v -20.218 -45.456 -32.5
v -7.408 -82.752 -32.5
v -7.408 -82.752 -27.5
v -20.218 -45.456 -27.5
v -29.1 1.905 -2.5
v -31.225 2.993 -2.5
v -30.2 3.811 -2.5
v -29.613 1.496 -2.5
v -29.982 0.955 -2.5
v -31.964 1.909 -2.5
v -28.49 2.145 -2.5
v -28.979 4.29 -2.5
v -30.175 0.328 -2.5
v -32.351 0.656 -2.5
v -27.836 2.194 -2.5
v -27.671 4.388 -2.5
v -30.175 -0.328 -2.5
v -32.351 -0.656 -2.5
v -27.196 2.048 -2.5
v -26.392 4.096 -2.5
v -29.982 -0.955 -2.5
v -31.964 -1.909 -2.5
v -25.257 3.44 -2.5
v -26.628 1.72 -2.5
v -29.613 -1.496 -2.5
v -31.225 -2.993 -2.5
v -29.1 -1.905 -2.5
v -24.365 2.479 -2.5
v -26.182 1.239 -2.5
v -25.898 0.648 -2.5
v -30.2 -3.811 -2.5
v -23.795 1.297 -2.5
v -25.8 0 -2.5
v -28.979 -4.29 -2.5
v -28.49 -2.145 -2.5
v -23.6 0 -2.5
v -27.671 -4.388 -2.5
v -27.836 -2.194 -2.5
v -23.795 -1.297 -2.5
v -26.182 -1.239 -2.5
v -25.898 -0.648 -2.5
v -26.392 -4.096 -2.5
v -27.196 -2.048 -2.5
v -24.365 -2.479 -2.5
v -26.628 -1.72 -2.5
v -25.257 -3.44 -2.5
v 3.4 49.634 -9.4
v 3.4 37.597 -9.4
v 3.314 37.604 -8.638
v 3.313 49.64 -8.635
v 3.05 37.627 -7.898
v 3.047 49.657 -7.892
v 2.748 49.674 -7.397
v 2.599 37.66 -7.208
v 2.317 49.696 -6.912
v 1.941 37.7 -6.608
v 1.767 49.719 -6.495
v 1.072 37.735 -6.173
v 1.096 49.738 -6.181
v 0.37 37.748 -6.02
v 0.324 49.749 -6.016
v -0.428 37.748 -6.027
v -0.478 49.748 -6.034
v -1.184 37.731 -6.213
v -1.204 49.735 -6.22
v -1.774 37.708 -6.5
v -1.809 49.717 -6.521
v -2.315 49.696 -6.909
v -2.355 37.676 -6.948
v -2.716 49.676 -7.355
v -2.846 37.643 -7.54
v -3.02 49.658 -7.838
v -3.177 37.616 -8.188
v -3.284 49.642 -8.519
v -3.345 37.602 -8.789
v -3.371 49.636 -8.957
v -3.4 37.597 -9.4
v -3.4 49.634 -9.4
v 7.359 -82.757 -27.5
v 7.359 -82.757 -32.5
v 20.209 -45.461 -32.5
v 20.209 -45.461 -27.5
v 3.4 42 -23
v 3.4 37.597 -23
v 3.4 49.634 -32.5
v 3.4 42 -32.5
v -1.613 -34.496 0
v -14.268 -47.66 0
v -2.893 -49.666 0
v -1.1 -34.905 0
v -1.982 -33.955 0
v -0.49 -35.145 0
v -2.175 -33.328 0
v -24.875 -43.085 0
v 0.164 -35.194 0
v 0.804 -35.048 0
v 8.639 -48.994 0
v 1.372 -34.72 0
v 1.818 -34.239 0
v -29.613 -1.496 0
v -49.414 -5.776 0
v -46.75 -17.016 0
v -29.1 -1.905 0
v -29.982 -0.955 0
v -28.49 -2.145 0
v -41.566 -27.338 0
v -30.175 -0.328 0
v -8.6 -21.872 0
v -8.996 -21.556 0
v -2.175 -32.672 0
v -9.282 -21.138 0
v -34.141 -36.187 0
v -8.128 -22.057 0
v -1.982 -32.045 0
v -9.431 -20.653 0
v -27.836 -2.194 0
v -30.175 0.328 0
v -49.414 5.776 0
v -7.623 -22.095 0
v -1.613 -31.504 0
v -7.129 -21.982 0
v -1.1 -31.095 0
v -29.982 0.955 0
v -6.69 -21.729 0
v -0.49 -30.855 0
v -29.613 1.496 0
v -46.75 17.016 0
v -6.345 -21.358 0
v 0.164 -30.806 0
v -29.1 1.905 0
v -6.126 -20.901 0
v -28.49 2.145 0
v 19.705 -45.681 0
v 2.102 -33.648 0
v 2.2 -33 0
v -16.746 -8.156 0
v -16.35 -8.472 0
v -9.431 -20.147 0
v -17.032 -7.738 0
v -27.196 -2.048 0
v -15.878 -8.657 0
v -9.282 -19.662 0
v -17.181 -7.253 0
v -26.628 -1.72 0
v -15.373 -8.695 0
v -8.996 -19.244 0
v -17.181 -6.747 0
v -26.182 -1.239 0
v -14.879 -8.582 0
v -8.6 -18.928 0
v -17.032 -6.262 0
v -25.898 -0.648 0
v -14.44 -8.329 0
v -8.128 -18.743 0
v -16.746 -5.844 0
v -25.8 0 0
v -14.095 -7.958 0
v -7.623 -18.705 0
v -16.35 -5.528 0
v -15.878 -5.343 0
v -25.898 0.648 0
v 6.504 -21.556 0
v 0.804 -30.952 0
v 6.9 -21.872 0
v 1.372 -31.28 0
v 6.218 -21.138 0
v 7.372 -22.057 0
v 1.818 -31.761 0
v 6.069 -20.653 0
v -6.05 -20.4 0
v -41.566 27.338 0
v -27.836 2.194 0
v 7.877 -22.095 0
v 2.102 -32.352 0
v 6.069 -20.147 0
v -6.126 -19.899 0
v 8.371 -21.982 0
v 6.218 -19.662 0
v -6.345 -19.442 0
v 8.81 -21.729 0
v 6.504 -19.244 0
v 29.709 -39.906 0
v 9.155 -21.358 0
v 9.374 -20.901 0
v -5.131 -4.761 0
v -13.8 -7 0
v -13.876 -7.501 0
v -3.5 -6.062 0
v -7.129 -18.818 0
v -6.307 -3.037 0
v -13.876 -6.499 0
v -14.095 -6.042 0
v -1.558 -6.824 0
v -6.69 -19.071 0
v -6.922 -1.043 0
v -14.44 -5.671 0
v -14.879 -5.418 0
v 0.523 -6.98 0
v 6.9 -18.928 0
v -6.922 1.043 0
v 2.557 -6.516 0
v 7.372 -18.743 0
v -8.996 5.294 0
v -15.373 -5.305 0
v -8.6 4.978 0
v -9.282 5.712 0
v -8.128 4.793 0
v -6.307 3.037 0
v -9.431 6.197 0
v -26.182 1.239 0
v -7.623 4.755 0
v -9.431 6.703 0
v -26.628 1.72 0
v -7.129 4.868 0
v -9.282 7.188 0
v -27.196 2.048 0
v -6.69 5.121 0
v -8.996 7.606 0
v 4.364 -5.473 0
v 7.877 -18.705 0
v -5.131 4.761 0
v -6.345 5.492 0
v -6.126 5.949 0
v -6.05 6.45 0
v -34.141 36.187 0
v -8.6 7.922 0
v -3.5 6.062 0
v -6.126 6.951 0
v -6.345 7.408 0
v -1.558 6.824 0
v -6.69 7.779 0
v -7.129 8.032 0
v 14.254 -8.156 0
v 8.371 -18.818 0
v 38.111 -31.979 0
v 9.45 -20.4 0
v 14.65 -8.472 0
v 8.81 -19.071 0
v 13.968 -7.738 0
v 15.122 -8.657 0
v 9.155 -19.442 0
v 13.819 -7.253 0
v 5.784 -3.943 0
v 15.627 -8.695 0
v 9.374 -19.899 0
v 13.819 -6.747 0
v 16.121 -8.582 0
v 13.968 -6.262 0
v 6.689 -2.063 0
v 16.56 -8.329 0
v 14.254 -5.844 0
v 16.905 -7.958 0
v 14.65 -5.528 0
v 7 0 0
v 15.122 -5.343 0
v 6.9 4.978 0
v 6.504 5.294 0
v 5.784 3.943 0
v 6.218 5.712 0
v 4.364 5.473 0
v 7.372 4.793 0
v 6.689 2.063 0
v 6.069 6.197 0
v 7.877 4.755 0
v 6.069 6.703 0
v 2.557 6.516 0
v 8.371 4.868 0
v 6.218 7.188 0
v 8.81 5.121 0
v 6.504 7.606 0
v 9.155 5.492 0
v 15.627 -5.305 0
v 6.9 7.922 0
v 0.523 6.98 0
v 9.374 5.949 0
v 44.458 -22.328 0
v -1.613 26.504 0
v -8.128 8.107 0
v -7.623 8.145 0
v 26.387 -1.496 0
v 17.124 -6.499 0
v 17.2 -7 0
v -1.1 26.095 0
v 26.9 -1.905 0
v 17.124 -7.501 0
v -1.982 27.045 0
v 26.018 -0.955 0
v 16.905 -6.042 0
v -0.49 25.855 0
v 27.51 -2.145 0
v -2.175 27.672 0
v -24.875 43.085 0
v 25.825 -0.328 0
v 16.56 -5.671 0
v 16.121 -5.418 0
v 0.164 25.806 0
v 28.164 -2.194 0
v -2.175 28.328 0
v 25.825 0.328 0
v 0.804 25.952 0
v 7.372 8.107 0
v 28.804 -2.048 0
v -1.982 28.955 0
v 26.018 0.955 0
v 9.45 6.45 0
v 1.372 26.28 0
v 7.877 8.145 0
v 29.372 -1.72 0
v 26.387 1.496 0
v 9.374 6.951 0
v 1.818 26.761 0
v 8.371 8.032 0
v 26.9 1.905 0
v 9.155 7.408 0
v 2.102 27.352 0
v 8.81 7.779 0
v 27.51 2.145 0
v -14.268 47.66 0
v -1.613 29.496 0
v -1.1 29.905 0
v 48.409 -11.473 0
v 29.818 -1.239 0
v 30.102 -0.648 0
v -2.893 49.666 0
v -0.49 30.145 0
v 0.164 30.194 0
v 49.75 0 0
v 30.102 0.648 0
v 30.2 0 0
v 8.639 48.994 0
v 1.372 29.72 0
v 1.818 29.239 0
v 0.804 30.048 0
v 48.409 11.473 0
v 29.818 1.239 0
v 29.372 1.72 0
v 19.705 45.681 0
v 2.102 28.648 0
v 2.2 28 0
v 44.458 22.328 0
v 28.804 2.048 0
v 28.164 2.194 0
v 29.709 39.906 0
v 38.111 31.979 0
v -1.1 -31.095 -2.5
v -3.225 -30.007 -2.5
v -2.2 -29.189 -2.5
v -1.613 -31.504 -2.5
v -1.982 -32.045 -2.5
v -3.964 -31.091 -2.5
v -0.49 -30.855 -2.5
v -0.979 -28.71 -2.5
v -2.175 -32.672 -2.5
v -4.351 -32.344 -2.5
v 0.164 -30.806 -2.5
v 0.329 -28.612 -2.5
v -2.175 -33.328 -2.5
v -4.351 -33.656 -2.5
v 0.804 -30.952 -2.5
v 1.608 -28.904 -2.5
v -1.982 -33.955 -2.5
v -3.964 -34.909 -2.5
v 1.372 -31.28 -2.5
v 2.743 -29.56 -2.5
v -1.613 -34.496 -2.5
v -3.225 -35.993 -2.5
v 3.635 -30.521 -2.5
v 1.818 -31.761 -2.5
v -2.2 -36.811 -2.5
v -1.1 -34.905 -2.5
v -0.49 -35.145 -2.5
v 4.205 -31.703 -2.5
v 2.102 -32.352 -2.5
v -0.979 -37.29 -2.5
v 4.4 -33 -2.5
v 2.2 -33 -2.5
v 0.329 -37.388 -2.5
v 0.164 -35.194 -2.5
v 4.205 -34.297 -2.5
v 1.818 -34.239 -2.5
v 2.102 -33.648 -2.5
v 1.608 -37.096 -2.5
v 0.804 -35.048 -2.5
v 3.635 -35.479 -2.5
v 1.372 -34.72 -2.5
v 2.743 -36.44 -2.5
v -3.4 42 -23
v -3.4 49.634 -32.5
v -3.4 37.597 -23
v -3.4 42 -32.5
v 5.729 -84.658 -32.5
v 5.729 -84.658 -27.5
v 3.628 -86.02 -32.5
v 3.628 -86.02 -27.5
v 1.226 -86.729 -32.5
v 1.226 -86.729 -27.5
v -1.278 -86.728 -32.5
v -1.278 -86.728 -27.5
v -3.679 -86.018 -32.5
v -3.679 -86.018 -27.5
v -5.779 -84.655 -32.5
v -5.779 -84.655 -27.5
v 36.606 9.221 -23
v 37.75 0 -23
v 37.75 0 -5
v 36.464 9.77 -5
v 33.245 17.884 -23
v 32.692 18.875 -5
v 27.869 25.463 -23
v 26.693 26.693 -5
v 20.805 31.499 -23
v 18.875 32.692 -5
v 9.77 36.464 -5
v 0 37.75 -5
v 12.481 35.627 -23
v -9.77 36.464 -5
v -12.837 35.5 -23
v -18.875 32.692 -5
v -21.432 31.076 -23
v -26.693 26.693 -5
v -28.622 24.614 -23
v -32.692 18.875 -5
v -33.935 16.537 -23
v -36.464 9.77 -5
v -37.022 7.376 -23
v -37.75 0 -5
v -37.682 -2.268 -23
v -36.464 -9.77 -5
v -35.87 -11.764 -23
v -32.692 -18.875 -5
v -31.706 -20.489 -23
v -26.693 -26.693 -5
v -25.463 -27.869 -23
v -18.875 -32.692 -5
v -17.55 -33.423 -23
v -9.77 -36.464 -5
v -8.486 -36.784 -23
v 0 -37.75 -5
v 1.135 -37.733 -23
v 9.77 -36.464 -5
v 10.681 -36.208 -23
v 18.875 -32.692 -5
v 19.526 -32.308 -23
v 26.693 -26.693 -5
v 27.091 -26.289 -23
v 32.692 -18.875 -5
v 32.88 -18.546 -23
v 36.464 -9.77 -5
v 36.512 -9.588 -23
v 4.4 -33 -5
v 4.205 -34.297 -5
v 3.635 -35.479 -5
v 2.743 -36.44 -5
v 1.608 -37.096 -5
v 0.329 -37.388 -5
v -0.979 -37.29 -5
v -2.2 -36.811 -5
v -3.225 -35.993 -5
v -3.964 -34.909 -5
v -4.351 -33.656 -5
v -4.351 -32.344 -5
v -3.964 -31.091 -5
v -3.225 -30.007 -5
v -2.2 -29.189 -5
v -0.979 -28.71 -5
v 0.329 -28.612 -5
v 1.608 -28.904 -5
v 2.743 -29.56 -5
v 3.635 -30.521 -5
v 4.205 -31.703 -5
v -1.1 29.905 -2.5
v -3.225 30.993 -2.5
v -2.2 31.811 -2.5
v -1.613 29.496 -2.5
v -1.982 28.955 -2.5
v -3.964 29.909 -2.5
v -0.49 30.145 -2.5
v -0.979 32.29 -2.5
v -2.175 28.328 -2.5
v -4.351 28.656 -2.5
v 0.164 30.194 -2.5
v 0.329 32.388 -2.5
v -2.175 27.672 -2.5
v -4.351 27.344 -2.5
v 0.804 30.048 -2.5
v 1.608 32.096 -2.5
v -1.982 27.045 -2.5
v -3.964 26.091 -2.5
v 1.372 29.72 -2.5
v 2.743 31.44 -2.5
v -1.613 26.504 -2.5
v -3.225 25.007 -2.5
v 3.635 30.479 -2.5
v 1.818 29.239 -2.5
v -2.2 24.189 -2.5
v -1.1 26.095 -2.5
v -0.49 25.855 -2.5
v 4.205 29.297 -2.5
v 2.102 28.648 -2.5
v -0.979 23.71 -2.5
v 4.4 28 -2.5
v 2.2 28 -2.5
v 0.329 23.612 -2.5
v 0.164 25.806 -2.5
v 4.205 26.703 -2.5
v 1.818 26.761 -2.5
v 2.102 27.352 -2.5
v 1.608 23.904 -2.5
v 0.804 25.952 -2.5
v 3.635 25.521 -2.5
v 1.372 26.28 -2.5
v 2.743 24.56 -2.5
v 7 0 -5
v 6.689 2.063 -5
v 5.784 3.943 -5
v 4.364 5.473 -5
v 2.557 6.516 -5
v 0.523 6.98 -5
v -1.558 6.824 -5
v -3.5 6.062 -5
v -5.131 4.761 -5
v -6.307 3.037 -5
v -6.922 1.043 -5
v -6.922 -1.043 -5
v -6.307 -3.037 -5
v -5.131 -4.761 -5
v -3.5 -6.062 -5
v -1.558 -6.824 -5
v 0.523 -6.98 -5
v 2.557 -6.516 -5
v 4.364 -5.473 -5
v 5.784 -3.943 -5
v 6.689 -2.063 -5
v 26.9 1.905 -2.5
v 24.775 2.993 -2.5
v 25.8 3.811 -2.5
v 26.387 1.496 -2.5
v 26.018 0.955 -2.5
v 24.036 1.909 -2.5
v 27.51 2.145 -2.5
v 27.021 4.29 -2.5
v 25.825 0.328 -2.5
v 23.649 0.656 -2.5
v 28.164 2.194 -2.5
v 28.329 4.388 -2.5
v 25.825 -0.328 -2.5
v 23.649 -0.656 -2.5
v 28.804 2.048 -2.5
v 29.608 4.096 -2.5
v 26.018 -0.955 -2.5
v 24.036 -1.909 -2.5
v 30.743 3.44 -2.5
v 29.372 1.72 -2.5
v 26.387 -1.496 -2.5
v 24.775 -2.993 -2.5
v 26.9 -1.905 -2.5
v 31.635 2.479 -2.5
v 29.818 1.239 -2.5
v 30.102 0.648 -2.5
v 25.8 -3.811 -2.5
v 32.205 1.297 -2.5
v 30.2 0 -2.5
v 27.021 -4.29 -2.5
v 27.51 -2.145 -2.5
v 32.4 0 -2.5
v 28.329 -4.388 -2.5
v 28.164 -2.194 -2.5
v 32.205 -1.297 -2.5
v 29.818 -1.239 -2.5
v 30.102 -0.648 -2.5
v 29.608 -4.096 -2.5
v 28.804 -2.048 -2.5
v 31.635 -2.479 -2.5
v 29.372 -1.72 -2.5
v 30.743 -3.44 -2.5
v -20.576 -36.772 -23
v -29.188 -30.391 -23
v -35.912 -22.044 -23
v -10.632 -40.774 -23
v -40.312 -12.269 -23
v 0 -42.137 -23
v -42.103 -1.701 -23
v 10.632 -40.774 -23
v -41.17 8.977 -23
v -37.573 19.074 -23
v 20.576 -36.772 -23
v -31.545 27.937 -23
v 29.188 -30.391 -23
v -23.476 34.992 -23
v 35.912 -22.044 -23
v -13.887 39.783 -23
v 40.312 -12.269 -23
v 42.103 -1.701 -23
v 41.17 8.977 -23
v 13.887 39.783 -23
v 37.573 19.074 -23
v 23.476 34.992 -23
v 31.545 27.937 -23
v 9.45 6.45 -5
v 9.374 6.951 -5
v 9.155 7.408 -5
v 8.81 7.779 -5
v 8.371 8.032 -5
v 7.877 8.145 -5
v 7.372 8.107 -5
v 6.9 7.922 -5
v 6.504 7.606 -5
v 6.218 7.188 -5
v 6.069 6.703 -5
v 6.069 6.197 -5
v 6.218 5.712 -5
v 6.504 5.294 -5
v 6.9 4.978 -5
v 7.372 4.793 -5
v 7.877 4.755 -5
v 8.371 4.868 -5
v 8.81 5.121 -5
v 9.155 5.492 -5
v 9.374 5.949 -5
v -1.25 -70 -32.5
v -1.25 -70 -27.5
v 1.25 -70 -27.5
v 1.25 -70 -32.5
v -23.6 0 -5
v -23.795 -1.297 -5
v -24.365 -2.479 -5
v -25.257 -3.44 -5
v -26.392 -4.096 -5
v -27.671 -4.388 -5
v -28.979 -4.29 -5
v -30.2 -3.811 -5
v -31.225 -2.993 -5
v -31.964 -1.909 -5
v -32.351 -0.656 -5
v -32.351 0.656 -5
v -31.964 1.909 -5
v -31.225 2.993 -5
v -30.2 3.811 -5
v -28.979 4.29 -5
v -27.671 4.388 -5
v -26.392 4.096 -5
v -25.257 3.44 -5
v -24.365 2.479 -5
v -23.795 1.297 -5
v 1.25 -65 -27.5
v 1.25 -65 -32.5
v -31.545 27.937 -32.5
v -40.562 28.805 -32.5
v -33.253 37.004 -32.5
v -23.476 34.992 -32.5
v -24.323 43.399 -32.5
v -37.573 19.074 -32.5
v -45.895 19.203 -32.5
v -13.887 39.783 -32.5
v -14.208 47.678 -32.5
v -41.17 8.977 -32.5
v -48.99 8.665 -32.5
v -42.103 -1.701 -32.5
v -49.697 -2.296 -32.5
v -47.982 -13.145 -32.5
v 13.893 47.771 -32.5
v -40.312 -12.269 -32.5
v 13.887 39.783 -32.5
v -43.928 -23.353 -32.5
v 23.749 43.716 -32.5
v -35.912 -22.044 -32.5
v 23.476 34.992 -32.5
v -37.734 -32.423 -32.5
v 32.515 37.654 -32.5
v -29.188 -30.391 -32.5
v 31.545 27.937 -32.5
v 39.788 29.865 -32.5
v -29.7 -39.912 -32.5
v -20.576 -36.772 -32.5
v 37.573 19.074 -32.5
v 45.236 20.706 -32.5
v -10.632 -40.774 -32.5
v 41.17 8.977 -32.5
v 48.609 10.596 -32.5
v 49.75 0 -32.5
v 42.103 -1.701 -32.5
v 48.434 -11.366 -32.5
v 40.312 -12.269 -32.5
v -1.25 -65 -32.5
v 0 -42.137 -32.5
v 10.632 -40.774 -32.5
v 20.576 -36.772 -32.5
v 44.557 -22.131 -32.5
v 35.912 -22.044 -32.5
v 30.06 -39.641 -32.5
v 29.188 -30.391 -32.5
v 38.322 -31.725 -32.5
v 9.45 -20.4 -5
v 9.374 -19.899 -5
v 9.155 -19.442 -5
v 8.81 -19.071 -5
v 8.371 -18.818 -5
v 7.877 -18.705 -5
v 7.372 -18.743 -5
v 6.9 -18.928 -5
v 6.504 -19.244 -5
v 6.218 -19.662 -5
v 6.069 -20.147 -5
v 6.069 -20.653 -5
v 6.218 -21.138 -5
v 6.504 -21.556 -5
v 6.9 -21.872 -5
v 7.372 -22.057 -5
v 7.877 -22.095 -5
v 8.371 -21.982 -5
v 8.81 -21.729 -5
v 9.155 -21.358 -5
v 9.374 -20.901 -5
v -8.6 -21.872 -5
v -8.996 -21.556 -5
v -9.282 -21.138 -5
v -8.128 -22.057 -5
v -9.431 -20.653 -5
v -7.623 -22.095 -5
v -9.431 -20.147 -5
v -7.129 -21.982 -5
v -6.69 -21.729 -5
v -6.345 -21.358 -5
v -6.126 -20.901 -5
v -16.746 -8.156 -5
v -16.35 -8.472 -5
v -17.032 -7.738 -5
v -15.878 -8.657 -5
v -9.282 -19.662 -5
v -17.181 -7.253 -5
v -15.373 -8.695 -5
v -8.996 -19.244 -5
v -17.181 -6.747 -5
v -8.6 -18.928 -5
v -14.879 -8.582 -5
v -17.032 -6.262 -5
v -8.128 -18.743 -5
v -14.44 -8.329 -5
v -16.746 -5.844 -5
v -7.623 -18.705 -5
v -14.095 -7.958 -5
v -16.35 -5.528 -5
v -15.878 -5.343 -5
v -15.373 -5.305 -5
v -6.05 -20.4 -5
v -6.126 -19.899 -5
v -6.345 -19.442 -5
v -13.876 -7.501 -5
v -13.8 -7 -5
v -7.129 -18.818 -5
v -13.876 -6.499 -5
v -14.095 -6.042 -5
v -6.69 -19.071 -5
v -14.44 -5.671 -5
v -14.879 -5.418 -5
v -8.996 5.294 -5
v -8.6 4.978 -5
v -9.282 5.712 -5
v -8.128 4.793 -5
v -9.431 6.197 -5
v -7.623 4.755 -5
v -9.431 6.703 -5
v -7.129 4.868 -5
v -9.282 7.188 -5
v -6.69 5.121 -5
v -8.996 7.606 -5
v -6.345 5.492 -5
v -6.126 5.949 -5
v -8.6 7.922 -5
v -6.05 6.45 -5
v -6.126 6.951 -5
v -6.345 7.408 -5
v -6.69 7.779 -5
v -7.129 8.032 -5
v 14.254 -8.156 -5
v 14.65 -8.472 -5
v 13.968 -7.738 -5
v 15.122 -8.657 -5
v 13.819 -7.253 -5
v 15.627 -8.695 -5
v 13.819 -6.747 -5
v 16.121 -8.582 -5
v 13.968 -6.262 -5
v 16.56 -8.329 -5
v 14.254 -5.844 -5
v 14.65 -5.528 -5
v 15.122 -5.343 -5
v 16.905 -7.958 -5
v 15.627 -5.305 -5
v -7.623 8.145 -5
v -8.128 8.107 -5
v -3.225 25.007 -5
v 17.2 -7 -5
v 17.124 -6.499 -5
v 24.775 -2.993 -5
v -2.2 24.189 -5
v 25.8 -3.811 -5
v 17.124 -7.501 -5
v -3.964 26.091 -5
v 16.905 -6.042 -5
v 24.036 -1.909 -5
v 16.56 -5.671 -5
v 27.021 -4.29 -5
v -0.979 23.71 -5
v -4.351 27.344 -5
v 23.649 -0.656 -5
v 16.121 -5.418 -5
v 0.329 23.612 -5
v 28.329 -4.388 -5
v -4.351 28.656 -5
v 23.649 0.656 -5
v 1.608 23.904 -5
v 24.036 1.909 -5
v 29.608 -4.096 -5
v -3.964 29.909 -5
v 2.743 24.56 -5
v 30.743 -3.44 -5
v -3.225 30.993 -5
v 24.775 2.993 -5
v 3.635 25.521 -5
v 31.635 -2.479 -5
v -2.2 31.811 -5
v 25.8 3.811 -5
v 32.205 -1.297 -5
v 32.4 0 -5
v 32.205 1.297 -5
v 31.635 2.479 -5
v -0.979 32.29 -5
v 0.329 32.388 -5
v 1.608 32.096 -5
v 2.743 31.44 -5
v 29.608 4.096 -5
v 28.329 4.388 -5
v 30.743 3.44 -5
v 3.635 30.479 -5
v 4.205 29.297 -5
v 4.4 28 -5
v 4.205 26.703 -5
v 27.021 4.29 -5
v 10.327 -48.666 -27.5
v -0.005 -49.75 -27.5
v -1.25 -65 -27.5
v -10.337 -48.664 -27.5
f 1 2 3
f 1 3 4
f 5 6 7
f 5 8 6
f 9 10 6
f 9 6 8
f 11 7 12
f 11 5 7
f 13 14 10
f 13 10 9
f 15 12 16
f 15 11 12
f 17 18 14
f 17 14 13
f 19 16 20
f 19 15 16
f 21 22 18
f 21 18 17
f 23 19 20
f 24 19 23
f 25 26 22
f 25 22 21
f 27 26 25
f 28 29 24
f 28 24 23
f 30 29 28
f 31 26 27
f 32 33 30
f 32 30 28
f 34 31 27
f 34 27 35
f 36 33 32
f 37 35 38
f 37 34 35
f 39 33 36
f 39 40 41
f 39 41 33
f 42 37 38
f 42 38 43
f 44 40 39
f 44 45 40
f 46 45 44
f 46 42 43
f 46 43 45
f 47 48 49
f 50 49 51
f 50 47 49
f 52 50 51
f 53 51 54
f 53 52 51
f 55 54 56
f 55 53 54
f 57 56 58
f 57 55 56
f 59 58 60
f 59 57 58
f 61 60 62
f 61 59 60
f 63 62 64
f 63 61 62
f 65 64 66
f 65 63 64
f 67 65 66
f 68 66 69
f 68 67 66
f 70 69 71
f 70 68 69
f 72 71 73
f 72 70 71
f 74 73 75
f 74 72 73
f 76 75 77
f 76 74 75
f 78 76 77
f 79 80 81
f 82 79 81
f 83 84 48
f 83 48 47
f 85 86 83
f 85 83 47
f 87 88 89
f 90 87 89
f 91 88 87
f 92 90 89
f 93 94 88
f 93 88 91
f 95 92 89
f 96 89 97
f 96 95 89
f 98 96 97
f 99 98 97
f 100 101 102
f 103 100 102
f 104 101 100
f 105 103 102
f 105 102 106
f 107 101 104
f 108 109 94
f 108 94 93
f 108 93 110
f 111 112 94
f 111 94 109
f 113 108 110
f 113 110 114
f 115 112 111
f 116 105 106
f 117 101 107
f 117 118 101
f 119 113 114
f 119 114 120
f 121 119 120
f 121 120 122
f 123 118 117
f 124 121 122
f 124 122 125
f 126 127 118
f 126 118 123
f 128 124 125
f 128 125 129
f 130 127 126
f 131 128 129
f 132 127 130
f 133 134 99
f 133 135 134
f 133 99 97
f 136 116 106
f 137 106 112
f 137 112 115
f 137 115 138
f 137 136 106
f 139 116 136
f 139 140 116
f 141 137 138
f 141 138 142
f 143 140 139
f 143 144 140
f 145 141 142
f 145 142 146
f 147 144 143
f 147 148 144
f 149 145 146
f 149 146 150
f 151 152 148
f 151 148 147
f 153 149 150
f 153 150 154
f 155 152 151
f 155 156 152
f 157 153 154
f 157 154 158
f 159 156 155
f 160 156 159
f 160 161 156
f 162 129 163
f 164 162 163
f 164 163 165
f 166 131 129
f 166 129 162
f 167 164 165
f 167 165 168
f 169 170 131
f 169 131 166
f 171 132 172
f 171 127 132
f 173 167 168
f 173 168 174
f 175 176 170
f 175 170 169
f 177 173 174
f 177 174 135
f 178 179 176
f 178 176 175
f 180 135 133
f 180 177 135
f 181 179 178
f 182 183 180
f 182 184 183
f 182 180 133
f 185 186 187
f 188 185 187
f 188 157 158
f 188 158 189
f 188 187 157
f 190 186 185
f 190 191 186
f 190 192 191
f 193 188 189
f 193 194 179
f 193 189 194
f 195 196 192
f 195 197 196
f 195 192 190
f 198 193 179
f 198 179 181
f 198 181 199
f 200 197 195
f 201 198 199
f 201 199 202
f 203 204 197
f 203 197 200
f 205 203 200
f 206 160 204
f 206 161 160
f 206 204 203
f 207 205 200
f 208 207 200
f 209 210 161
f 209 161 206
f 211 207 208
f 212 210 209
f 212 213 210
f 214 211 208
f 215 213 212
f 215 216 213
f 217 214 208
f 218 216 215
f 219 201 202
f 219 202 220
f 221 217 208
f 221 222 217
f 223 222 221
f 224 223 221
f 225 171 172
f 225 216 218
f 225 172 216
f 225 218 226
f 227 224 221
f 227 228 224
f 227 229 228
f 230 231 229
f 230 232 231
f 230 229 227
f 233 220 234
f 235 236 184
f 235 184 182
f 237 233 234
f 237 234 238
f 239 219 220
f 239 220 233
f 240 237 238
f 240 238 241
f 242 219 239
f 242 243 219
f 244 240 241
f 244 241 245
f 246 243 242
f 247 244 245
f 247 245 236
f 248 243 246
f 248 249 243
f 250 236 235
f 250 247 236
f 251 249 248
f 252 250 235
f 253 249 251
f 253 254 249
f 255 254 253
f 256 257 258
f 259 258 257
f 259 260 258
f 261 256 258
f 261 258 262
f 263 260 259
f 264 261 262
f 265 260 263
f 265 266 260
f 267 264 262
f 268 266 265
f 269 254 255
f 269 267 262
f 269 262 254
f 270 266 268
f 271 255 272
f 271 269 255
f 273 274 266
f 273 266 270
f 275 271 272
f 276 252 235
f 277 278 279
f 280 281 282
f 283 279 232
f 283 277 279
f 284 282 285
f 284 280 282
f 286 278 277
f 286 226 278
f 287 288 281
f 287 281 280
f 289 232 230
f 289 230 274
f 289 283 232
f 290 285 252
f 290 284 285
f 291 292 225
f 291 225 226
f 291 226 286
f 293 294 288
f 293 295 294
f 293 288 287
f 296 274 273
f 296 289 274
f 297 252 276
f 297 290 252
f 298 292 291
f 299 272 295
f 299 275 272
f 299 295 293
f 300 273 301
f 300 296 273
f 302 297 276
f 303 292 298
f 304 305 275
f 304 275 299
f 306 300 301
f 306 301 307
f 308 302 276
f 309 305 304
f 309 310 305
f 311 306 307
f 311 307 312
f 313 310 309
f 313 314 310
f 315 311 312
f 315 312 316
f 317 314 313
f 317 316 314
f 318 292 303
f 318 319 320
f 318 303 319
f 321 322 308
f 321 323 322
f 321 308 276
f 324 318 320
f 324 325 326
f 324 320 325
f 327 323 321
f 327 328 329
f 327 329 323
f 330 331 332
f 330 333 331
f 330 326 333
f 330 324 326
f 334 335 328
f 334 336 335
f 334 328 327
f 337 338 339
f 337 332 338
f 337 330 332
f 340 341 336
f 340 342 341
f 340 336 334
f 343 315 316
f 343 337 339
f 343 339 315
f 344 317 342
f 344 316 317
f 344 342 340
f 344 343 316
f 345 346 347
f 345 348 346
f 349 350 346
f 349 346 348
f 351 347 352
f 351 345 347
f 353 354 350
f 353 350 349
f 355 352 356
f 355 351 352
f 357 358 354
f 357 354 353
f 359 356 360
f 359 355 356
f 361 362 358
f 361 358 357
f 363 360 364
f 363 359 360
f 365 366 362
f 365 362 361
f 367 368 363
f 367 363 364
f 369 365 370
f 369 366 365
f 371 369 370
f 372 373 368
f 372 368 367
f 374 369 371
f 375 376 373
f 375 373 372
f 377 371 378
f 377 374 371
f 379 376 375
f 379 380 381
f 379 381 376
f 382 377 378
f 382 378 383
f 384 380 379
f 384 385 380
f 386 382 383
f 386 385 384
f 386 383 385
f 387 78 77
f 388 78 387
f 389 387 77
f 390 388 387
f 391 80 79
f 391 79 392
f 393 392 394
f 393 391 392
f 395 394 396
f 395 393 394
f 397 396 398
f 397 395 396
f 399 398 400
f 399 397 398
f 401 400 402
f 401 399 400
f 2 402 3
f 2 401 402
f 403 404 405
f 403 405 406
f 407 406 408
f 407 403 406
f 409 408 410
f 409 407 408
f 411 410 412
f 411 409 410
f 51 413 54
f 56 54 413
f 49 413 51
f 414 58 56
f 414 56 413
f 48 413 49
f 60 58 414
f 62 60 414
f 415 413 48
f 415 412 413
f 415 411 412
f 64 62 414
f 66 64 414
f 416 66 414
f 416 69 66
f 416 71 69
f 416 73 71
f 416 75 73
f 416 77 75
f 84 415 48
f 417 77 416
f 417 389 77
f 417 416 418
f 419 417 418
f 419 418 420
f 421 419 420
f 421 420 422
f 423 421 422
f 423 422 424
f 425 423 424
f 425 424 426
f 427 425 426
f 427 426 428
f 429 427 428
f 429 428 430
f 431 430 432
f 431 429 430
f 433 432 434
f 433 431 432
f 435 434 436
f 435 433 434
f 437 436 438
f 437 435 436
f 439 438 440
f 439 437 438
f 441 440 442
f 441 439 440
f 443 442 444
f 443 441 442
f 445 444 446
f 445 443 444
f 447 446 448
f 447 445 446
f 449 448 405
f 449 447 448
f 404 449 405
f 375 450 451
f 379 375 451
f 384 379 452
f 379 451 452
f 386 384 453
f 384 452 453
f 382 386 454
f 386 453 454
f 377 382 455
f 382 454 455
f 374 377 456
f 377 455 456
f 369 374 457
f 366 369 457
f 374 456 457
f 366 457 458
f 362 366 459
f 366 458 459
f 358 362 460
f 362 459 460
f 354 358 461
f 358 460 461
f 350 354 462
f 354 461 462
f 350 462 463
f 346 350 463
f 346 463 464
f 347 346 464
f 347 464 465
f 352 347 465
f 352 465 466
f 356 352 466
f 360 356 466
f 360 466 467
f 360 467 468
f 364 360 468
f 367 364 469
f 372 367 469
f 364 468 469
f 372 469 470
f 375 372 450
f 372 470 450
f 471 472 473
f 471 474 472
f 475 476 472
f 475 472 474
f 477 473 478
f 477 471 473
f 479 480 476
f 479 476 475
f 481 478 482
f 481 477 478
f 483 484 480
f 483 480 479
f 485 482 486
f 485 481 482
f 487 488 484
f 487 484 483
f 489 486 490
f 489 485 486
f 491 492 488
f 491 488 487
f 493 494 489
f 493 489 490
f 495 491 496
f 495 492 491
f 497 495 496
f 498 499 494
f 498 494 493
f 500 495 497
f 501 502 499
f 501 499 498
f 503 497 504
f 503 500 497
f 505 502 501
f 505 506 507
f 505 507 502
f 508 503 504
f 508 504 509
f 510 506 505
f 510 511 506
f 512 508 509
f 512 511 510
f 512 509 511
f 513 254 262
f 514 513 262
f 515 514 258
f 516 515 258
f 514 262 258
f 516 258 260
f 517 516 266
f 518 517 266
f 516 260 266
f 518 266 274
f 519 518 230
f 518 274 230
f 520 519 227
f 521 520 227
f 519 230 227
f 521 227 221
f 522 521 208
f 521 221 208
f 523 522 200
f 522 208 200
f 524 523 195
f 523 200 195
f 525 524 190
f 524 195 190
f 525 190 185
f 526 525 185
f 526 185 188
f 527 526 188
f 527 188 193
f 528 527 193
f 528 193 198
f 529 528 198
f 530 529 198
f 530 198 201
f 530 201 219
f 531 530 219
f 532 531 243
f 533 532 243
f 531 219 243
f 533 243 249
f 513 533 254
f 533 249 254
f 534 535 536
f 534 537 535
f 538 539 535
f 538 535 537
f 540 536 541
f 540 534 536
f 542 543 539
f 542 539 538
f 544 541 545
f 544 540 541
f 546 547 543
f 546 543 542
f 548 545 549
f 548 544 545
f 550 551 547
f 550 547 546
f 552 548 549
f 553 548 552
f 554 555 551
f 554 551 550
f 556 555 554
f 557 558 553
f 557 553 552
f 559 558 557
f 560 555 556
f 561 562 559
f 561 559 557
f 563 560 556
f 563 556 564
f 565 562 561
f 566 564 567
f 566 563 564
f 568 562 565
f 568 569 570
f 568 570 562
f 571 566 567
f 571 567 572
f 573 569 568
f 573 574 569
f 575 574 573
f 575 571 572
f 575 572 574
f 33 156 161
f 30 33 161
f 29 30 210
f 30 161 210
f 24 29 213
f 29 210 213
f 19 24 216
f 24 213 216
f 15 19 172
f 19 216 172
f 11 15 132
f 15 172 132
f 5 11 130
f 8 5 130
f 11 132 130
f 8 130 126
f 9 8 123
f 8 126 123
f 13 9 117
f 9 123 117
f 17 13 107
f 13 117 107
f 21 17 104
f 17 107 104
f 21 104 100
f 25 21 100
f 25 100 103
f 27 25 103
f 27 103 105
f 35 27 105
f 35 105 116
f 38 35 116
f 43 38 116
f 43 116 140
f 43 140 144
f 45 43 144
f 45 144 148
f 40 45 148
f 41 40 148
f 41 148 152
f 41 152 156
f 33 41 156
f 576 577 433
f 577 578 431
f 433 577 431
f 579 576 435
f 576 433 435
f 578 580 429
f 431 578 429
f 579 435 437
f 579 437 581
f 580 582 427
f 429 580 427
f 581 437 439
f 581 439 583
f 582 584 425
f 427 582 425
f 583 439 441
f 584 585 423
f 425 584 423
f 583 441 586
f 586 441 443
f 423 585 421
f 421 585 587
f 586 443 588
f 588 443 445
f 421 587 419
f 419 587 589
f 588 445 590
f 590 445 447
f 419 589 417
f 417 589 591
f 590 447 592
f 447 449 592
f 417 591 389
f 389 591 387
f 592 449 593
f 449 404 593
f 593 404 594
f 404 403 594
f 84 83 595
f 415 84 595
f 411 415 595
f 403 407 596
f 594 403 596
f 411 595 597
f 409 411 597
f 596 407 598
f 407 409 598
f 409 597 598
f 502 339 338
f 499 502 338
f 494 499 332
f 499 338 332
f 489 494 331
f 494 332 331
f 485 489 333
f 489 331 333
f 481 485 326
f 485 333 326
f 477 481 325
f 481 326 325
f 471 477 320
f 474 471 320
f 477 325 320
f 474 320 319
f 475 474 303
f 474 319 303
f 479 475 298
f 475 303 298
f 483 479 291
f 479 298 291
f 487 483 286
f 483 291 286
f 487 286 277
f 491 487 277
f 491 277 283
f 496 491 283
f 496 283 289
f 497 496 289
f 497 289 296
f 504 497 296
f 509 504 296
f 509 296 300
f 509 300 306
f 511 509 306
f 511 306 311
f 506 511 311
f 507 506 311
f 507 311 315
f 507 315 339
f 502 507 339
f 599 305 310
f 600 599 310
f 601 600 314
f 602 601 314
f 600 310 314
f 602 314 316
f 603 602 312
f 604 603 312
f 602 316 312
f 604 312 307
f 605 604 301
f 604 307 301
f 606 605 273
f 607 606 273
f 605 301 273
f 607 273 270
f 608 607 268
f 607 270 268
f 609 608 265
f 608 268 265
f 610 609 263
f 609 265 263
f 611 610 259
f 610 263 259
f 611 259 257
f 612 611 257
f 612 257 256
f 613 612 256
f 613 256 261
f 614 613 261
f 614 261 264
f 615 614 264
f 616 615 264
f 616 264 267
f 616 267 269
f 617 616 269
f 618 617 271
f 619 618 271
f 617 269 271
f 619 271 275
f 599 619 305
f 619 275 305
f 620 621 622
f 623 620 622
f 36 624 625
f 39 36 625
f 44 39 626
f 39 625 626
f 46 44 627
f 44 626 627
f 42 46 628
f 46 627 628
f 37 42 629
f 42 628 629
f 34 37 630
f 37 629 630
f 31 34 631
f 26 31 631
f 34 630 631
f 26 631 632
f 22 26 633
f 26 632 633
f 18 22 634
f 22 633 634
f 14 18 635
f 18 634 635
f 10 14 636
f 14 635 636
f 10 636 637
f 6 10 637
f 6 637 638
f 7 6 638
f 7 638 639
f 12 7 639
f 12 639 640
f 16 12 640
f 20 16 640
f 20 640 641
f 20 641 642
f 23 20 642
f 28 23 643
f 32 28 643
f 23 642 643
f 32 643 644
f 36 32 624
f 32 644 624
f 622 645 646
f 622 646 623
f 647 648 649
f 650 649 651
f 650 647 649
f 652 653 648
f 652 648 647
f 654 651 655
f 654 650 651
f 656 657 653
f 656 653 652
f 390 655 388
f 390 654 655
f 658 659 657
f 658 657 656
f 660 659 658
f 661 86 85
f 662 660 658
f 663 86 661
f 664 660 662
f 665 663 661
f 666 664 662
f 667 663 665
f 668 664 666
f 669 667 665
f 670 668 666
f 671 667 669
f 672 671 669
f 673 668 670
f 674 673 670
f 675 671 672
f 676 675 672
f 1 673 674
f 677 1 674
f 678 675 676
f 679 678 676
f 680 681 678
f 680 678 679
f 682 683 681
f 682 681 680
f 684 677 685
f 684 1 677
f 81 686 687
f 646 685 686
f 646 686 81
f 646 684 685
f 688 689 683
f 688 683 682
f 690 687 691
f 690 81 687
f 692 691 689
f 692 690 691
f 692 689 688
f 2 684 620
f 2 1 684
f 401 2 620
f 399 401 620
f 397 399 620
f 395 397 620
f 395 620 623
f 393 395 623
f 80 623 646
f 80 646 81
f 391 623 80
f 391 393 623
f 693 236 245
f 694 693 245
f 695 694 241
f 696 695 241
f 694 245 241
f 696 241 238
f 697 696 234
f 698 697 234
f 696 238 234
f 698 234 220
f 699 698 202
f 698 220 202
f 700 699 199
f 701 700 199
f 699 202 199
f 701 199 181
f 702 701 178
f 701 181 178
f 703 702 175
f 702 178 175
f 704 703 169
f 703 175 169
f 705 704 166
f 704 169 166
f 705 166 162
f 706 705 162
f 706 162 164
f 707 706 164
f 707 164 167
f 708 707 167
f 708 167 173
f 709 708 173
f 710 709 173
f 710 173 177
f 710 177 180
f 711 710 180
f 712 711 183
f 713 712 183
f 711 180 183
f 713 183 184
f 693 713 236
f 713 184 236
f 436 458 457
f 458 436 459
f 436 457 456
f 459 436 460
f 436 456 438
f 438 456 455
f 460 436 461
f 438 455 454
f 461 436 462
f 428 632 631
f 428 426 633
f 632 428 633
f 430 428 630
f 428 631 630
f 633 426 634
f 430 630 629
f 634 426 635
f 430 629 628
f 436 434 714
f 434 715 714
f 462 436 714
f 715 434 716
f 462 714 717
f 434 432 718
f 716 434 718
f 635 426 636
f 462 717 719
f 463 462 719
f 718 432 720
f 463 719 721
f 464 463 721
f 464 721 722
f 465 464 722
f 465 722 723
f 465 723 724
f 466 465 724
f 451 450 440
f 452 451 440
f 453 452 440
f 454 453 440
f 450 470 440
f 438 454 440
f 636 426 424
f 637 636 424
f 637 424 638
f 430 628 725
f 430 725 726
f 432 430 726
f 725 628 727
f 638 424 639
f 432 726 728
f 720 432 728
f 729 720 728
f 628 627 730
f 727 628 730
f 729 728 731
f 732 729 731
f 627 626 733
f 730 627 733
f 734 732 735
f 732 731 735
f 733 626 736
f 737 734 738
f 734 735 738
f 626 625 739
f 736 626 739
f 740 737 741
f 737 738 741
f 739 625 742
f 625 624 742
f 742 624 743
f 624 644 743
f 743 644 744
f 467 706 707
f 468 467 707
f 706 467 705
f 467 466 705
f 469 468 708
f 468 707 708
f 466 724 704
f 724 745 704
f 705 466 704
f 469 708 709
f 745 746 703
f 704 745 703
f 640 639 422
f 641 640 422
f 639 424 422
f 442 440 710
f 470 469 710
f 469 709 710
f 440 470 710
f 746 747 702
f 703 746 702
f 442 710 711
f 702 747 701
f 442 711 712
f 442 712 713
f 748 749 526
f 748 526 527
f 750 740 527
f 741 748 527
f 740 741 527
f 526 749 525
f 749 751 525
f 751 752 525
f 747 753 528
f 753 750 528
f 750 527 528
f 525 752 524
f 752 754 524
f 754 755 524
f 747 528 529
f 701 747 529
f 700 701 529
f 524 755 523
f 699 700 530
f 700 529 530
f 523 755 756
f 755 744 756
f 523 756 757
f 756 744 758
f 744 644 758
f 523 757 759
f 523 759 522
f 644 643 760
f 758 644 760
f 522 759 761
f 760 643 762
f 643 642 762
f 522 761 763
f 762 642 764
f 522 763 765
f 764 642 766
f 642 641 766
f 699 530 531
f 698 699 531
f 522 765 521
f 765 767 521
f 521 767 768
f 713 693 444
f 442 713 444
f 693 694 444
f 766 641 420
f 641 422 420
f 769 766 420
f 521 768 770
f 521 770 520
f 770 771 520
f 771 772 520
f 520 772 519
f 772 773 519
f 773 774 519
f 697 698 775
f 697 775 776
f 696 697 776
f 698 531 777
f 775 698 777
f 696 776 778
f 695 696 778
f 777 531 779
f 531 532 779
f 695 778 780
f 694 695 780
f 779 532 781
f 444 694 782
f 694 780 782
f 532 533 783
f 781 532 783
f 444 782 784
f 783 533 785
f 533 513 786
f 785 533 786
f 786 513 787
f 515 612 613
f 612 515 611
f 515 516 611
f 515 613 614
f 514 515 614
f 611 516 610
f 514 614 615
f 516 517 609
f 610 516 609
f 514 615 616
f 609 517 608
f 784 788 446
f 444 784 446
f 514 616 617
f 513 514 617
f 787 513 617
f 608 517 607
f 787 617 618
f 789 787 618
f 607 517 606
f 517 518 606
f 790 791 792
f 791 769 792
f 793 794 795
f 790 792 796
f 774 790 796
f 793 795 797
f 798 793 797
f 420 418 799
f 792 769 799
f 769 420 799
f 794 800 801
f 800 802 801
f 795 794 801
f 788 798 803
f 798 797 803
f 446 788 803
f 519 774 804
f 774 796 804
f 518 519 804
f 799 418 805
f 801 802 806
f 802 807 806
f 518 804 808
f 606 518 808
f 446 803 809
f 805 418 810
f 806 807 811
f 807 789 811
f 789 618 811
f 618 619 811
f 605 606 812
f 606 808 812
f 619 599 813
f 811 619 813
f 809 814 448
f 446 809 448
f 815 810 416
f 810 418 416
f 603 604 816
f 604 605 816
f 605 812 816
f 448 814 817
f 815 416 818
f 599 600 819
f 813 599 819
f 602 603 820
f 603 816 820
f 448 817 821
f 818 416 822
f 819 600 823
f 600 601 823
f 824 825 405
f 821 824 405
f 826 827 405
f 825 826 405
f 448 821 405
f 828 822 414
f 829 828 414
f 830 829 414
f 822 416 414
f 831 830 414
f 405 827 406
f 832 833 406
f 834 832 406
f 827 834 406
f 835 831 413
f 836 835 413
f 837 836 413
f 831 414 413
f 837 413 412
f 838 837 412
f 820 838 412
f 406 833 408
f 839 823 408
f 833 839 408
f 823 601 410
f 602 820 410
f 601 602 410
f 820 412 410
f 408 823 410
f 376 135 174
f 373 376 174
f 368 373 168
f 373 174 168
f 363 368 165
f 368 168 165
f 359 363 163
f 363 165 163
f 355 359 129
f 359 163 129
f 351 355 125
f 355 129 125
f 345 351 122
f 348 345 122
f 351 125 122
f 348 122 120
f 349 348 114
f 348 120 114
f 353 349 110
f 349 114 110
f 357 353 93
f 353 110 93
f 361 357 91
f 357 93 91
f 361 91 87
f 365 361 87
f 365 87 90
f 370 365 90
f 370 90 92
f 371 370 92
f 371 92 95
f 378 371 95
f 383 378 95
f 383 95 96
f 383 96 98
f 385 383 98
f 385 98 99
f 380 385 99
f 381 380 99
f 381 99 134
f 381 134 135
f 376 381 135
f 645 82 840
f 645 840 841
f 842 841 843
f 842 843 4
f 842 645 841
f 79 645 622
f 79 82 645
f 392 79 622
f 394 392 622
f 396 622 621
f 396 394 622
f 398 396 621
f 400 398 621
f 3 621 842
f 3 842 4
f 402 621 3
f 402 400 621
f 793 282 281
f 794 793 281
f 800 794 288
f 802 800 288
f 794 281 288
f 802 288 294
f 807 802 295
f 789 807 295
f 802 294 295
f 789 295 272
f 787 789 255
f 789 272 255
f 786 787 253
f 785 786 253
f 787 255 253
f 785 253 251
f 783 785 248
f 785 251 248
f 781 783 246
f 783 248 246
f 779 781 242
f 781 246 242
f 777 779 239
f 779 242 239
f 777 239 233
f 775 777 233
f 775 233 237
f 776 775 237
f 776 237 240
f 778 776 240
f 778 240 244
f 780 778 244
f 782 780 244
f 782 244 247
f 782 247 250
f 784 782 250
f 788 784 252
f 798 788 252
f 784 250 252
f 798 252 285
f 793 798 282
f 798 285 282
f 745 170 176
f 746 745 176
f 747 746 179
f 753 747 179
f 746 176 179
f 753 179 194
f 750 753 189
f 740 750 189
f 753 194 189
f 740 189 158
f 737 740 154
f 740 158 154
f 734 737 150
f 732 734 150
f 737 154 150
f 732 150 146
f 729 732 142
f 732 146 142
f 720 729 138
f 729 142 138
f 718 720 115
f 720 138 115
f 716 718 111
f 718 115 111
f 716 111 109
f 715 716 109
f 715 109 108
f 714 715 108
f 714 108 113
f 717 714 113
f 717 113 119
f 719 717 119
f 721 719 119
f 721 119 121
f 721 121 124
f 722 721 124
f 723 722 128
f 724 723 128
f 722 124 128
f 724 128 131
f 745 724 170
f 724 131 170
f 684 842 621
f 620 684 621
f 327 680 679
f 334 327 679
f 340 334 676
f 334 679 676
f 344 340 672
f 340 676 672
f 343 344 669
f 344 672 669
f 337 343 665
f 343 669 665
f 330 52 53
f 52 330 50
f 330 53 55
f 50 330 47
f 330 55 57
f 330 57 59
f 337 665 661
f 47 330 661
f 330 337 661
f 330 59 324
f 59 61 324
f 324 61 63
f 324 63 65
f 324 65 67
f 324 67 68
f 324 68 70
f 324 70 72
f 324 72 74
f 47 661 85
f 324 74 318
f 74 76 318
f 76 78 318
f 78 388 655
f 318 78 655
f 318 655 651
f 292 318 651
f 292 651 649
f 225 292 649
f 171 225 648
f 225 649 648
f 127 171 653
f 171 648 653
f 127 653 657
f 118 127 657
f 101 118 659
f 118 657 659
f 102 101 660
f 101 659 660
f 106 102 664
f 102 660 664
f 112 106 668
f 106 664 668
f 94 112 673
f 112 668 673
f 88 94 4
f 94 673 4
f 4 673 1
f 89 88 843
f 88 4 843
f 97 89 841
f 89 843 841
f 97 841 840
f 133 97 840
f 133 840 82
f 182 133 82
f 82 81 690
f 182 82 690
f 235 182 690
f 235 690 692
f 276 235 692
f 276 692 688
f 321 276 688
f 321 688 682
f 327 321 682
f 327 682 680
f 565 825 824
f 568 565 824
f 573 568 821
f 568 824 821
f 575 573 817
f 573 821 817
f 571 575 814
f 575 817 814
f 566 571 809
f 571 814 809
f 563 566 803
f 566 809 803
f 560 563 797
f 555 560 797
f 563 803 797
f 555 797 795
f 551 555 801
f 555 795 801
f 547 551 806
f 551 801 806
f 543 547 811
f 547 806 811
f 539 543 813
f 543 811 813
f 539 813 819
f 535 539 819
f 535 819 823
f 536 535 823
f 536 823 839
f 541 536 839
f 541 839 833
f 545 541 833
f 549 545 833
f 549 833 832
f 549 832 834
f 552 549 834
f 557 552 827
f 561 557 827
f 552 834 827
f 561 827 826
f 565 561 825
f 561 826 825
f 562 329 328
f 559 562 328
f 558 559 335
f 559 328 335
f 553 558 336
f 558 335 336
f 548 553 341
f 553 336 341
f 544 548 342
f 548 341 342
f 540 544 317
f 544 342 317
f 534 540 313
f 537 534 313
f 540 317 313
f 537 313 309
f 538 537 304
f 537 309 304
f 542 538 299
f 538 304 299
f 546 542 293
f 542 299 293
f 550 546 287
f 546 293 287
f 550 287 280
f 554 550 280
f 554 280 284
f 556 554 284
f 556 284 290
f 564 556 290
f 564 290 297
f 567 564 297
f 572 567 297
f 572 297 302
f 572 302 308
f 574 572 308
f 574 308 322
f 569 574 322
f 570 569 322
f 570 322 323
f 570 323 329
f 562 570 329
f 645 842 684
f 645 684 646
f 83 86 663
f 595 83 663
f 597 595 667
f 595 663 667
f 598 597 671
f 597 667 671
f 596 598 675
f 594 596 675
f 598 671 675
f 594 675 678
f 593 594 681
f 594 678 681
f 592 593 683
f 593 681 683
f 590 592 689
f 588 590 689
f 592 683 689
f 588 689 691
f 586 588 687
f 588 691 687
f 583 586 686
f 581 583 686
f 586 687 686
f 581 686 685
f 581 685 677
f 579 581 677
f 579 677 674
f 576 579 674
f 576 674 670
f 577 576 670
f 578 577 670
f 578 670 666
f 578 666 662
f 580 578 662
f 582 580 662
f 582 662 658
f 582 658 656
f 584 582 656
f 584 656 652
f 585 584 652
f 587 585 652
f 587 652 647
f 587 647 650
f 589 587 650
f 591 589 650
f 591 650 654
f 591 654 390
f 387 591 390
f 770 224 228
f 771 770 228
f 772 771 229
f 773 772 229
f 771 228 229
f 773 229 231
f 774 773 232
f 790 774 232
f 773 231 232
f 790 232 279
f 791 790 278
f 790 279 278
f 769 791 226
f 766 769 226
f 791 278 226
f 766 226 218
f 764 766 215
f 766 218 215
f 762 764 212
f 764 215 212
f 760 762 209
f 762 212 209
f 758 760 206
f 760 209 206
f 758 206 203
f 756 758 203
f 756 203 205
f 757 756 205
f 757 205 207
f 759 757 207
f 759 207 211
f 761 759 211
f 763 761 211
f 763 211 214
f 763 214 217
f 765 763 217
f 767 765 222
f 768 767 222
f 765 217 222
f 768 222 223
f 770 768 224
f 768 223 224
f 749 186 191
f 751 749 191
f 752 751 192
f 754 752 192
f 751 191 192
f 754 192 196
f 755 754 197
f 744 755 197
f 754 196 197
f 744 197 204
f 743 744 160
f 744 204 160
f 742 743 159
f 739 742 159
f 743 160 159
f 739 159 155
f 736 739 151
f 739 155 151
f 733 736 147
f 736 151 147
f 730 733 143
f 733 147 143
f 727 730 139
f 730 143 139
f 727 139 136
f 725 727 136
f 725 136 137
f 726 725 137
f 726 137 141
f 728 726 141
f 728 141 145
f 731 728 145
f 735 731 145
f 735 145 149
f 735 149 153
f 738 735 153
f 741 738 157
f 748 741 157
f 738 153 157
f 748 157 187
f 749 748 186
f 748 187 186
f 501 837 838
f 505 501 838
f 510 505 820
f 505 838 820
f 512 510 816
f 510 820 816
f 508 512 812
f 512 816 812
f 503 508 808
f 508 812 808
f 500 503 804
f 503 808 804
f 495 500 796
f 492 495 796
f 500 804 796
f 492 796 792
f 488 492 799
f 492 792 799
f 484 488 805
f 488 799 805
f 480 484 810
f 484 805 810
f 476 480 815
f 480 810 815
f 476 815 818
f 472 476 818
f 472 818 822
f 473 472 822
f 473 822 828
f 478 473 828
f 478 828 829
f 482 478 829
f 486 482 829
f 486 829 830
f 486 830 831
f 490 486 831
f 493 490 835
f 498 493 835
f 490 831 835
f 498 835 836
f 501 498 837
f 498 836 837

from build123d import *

# Parameters (mm, degrees)
CYLINDER008_R     = 2
CYLINDER008_DEPTH = 3.2
CYLINDER009_R     = 1.7
CYLINDER009_DEPTH = 30
CYLINDER007_R     = 37.75
CYLINDER007_DEPTH = 63
CYLINDER013_R     = 42.75
CYLINDER013_DEPTH = 45
CYLINDER012_R     = 49.75
CYLINDER012_DEPTH = 32.5
SKETCH009_R       = 2.2
POCKET008_DEPTH   = 5
POCKET010_DEPTH   = 25
PAD002_DEPTH      = 5
SKETCH018_W       = 2.5
SKETCH018_H       = 5
POCKET016_DEPTH   = 27.501
SKETCH020_R       = 4
POCKET018_DEPTH   = 5
SKETCH021_R       = 4.4
POCKET019_DEPTH   = 2.5
SKETCH022_R       = 7
POCKET020_DEPTH   = 5
SKETCH023_R       = 1.7
POCKET021_DEPTH   = 5
PAD010_DEPTH      = 15


with BuildPart() as cylinder008:
    # Cylinder008 → Cylinder008 (new body)
    with BuildSketch(Plane.XY.offset(64.8)):
        Circle(CYLINDER008_R)
    extrude(amount=CYLINDER008_DEPTH)


with BuildPart() as fusion005:
    # Cylinder009 → Cylinder009 (new body)
    with BuildSketch(Plane.XY.offset(63)):
        Circle(CYLINDER009_R)
    extrude(amount=CYLINDER009_DEPTH)

    # Fusion005: union Cylinder008
    add(cylinder008.part)


with BuildPart() as cylinder007:
    # Cylinder007 → Cylinder007 (new body)
    with BuildSketch(Plane.XY):
        Circle(CYLINDER007_R)
    extrude(amount=CYLINDER007_DEPTH)


with BuildPart() as fusion006:
    # Cylinder013 → Cylinder013 (new body)
    with BuildSketch(Plane.XY):
        Circle(CYLINDER013_R)
    extrude(amount=CYLINDER013_DEPTH)

    # Fusion006: union Cylinder007
    add(cylinder007.part)


with BuildPart() as mounttocase:
    # Cylinder012 → Cylinder012 (new body)
    with BuildSketch(Plane.XY.offset(35.5)):
        Circle(CYLINDER012_R)
    extrude(amount=CYLINDER012_DEPTH)

    # Cut008: cut Fusion006
    add(fusion006.part, mode=Mode.SUBTRACT)

    # Cut009: cut Fusion005
    add(fusion005.part, mode=Mode.SUBTRACT)

    # Sketch009 (on Face3 of Cut009) → Pocket008 (cut)
    with BuildSketch(Plane.XY.offset(68)):
        with Locations((0, 28)):
            Circle(SKETCH009_R)
        with Locations((28, 0)):
            Circle(SKETCH009_R)
        with Locations((0, -33)):
            Circle(SKETCH009_R)
        with Locations((-28, 0)):
            Circle(SKETCH009_R)
    extrude(amount=-POCKET008_DEPTH, mode=Mode.SUBTRACT)

    # Sketch011 → Pocket010 (cut)
    with BuildSketch(Plane(origin=(0, 60, -1), x_dir=(1, 0, 0), z_dir=(0, -1, 0))):
        with BuildLine():
            ThreePointArc((3.4, 59.599979), (1.2e-05, 63), (-3.4, 59.600003))
            Line((-3.4, 59.600003), (-3.4, 0))
            Line((-3.4, 0), (3.4, 0))
            Line((3.4, 59.599979), (3.4, 0))
        make_face()
    extrude(amount=POCKET010_DEPTH, mode=Mode.SUBTRACT)

    # Sketch017 (on Face2 of Pocket010) → Pad002 (join)
    with BuildSketch(Plane(origin=(0, 0, 35.5), x_dir=(1, 0, 0), z_dir=(0, 0, -1))):
        with BuildLine():
            ThreePointArc((20.231067, 45.395694), (-0.005277, 49.699749), (-20.240706, 45.391396))
            Line((-7.40759, 82.752427), (-20.240706, 45.391396))
            ThreePointArc((7.358623, 82.756756), (-0.025675, 86.818946), (-7.40759, 82.752427))
            Line((7.358623, 82.756756), (20.231067, 45.395694))
        make_face()
    extrude(amount=-PAD002_DEPTH)

    # Sketch018 (on Face22 of Pad002) → Pocket016 (cut, through all)
    with BuildSketch(Plane(origin=(0, 0, 63), x_dir=(1, 0, 0), z_dir=(0, 0, -1))):
        with Locations((0, 67.5)):
            Rectangle(SKETCH018_W, SKETCH018_H)
    extrude(amount=POCKET016_DEPTH, mode=Mode.SUBTRACT)

    # Sketch020 → Pocket018 (cut)
    with BuildSketch(Plane.XY.offset(68)):
        Circle(SKETCH020_R)
    extrude(amount=-POCKET018_DEPTH, mode=Mode.SUBTRACT)

    # Sketch021 (on Face26 of Pocket018) → Pocket019 (cut)
    with BuildSketch(Plane(origin=(0, 0, 63), x_dir=(1, 0, 0), z_dir=(0, 0, -1))):
        with Locations((0, 33)):
            Circle(SKETCH021_R)
        with Locations((28, 0)):
            Circle(SKETCH021_R)
        with Locations((-28, 0)):
            Circle(SKETCH021_R)
        with Locations((0, -28)):
            Circle(SKETCH021_R)
    extrude(amount=-POCKET019_DEPTH, mode=Mode.SUBTRACT)

    # Sketch022 (on Face2 of Pocket019) → Pocket020 (cut)
    with BuildSketch(Plane.XY.offset(68)):
        Circle(SKETCH022_R)
    extrude(amount=-POCKET020_DEPTH, mode=Mode.SUBTRACT)

    # Sketch023 (on Face2 of Pocket020) → Pocket021 (cut)
    with BuildSketch(Plane.XY.offset(68)):
        with Locations((-15.5, -7)):
            Circle(SKETCH023_R)
        with Locations((15.5, -7)):
            Circle(SKETCH023_R)
        with Locations((-7.75, -20.4)):
            Circle(SKETCH023_R)
        with Locations((7.75, -20.4)):
            Circle(SKETCH023_R)
        with Locations((-7.75, 6.45)):
            Circle(SKETCH023_R)
        with Locations((7.75, 6.45)):
            Circle(SKETCH023_R)
    extrude(amount=-POCKET021_DEPTH, mode=Mode.SUBTRACT)

    # Sketch051 → Pad010 (join)
    with BuildSketch(Plane(origin=(0, 0, 35.5), x_dir=(1, 0, 0), z_dir=(0, 0, -1))):
        with BuildLine():
            Line((3.4, -42), (3.4, -47))
            ThreePointArc((3.4, -47), (0, 47.122818), (-3.4, -47))
            Line((-3.4, -47), (-3.4, -42))
            ThreePointArc((3.4, -42), (0, 42.137394), (-3.4, -42))
        make_face()
    extrude(amount=-PAD010_DEPTH)


with BuildPart() as mounttocase_1:
    # Body001 placement: moved
    add(mounttocase.part.moved(Location((0, 0, -68))))


solid = mounttocase_1.part
